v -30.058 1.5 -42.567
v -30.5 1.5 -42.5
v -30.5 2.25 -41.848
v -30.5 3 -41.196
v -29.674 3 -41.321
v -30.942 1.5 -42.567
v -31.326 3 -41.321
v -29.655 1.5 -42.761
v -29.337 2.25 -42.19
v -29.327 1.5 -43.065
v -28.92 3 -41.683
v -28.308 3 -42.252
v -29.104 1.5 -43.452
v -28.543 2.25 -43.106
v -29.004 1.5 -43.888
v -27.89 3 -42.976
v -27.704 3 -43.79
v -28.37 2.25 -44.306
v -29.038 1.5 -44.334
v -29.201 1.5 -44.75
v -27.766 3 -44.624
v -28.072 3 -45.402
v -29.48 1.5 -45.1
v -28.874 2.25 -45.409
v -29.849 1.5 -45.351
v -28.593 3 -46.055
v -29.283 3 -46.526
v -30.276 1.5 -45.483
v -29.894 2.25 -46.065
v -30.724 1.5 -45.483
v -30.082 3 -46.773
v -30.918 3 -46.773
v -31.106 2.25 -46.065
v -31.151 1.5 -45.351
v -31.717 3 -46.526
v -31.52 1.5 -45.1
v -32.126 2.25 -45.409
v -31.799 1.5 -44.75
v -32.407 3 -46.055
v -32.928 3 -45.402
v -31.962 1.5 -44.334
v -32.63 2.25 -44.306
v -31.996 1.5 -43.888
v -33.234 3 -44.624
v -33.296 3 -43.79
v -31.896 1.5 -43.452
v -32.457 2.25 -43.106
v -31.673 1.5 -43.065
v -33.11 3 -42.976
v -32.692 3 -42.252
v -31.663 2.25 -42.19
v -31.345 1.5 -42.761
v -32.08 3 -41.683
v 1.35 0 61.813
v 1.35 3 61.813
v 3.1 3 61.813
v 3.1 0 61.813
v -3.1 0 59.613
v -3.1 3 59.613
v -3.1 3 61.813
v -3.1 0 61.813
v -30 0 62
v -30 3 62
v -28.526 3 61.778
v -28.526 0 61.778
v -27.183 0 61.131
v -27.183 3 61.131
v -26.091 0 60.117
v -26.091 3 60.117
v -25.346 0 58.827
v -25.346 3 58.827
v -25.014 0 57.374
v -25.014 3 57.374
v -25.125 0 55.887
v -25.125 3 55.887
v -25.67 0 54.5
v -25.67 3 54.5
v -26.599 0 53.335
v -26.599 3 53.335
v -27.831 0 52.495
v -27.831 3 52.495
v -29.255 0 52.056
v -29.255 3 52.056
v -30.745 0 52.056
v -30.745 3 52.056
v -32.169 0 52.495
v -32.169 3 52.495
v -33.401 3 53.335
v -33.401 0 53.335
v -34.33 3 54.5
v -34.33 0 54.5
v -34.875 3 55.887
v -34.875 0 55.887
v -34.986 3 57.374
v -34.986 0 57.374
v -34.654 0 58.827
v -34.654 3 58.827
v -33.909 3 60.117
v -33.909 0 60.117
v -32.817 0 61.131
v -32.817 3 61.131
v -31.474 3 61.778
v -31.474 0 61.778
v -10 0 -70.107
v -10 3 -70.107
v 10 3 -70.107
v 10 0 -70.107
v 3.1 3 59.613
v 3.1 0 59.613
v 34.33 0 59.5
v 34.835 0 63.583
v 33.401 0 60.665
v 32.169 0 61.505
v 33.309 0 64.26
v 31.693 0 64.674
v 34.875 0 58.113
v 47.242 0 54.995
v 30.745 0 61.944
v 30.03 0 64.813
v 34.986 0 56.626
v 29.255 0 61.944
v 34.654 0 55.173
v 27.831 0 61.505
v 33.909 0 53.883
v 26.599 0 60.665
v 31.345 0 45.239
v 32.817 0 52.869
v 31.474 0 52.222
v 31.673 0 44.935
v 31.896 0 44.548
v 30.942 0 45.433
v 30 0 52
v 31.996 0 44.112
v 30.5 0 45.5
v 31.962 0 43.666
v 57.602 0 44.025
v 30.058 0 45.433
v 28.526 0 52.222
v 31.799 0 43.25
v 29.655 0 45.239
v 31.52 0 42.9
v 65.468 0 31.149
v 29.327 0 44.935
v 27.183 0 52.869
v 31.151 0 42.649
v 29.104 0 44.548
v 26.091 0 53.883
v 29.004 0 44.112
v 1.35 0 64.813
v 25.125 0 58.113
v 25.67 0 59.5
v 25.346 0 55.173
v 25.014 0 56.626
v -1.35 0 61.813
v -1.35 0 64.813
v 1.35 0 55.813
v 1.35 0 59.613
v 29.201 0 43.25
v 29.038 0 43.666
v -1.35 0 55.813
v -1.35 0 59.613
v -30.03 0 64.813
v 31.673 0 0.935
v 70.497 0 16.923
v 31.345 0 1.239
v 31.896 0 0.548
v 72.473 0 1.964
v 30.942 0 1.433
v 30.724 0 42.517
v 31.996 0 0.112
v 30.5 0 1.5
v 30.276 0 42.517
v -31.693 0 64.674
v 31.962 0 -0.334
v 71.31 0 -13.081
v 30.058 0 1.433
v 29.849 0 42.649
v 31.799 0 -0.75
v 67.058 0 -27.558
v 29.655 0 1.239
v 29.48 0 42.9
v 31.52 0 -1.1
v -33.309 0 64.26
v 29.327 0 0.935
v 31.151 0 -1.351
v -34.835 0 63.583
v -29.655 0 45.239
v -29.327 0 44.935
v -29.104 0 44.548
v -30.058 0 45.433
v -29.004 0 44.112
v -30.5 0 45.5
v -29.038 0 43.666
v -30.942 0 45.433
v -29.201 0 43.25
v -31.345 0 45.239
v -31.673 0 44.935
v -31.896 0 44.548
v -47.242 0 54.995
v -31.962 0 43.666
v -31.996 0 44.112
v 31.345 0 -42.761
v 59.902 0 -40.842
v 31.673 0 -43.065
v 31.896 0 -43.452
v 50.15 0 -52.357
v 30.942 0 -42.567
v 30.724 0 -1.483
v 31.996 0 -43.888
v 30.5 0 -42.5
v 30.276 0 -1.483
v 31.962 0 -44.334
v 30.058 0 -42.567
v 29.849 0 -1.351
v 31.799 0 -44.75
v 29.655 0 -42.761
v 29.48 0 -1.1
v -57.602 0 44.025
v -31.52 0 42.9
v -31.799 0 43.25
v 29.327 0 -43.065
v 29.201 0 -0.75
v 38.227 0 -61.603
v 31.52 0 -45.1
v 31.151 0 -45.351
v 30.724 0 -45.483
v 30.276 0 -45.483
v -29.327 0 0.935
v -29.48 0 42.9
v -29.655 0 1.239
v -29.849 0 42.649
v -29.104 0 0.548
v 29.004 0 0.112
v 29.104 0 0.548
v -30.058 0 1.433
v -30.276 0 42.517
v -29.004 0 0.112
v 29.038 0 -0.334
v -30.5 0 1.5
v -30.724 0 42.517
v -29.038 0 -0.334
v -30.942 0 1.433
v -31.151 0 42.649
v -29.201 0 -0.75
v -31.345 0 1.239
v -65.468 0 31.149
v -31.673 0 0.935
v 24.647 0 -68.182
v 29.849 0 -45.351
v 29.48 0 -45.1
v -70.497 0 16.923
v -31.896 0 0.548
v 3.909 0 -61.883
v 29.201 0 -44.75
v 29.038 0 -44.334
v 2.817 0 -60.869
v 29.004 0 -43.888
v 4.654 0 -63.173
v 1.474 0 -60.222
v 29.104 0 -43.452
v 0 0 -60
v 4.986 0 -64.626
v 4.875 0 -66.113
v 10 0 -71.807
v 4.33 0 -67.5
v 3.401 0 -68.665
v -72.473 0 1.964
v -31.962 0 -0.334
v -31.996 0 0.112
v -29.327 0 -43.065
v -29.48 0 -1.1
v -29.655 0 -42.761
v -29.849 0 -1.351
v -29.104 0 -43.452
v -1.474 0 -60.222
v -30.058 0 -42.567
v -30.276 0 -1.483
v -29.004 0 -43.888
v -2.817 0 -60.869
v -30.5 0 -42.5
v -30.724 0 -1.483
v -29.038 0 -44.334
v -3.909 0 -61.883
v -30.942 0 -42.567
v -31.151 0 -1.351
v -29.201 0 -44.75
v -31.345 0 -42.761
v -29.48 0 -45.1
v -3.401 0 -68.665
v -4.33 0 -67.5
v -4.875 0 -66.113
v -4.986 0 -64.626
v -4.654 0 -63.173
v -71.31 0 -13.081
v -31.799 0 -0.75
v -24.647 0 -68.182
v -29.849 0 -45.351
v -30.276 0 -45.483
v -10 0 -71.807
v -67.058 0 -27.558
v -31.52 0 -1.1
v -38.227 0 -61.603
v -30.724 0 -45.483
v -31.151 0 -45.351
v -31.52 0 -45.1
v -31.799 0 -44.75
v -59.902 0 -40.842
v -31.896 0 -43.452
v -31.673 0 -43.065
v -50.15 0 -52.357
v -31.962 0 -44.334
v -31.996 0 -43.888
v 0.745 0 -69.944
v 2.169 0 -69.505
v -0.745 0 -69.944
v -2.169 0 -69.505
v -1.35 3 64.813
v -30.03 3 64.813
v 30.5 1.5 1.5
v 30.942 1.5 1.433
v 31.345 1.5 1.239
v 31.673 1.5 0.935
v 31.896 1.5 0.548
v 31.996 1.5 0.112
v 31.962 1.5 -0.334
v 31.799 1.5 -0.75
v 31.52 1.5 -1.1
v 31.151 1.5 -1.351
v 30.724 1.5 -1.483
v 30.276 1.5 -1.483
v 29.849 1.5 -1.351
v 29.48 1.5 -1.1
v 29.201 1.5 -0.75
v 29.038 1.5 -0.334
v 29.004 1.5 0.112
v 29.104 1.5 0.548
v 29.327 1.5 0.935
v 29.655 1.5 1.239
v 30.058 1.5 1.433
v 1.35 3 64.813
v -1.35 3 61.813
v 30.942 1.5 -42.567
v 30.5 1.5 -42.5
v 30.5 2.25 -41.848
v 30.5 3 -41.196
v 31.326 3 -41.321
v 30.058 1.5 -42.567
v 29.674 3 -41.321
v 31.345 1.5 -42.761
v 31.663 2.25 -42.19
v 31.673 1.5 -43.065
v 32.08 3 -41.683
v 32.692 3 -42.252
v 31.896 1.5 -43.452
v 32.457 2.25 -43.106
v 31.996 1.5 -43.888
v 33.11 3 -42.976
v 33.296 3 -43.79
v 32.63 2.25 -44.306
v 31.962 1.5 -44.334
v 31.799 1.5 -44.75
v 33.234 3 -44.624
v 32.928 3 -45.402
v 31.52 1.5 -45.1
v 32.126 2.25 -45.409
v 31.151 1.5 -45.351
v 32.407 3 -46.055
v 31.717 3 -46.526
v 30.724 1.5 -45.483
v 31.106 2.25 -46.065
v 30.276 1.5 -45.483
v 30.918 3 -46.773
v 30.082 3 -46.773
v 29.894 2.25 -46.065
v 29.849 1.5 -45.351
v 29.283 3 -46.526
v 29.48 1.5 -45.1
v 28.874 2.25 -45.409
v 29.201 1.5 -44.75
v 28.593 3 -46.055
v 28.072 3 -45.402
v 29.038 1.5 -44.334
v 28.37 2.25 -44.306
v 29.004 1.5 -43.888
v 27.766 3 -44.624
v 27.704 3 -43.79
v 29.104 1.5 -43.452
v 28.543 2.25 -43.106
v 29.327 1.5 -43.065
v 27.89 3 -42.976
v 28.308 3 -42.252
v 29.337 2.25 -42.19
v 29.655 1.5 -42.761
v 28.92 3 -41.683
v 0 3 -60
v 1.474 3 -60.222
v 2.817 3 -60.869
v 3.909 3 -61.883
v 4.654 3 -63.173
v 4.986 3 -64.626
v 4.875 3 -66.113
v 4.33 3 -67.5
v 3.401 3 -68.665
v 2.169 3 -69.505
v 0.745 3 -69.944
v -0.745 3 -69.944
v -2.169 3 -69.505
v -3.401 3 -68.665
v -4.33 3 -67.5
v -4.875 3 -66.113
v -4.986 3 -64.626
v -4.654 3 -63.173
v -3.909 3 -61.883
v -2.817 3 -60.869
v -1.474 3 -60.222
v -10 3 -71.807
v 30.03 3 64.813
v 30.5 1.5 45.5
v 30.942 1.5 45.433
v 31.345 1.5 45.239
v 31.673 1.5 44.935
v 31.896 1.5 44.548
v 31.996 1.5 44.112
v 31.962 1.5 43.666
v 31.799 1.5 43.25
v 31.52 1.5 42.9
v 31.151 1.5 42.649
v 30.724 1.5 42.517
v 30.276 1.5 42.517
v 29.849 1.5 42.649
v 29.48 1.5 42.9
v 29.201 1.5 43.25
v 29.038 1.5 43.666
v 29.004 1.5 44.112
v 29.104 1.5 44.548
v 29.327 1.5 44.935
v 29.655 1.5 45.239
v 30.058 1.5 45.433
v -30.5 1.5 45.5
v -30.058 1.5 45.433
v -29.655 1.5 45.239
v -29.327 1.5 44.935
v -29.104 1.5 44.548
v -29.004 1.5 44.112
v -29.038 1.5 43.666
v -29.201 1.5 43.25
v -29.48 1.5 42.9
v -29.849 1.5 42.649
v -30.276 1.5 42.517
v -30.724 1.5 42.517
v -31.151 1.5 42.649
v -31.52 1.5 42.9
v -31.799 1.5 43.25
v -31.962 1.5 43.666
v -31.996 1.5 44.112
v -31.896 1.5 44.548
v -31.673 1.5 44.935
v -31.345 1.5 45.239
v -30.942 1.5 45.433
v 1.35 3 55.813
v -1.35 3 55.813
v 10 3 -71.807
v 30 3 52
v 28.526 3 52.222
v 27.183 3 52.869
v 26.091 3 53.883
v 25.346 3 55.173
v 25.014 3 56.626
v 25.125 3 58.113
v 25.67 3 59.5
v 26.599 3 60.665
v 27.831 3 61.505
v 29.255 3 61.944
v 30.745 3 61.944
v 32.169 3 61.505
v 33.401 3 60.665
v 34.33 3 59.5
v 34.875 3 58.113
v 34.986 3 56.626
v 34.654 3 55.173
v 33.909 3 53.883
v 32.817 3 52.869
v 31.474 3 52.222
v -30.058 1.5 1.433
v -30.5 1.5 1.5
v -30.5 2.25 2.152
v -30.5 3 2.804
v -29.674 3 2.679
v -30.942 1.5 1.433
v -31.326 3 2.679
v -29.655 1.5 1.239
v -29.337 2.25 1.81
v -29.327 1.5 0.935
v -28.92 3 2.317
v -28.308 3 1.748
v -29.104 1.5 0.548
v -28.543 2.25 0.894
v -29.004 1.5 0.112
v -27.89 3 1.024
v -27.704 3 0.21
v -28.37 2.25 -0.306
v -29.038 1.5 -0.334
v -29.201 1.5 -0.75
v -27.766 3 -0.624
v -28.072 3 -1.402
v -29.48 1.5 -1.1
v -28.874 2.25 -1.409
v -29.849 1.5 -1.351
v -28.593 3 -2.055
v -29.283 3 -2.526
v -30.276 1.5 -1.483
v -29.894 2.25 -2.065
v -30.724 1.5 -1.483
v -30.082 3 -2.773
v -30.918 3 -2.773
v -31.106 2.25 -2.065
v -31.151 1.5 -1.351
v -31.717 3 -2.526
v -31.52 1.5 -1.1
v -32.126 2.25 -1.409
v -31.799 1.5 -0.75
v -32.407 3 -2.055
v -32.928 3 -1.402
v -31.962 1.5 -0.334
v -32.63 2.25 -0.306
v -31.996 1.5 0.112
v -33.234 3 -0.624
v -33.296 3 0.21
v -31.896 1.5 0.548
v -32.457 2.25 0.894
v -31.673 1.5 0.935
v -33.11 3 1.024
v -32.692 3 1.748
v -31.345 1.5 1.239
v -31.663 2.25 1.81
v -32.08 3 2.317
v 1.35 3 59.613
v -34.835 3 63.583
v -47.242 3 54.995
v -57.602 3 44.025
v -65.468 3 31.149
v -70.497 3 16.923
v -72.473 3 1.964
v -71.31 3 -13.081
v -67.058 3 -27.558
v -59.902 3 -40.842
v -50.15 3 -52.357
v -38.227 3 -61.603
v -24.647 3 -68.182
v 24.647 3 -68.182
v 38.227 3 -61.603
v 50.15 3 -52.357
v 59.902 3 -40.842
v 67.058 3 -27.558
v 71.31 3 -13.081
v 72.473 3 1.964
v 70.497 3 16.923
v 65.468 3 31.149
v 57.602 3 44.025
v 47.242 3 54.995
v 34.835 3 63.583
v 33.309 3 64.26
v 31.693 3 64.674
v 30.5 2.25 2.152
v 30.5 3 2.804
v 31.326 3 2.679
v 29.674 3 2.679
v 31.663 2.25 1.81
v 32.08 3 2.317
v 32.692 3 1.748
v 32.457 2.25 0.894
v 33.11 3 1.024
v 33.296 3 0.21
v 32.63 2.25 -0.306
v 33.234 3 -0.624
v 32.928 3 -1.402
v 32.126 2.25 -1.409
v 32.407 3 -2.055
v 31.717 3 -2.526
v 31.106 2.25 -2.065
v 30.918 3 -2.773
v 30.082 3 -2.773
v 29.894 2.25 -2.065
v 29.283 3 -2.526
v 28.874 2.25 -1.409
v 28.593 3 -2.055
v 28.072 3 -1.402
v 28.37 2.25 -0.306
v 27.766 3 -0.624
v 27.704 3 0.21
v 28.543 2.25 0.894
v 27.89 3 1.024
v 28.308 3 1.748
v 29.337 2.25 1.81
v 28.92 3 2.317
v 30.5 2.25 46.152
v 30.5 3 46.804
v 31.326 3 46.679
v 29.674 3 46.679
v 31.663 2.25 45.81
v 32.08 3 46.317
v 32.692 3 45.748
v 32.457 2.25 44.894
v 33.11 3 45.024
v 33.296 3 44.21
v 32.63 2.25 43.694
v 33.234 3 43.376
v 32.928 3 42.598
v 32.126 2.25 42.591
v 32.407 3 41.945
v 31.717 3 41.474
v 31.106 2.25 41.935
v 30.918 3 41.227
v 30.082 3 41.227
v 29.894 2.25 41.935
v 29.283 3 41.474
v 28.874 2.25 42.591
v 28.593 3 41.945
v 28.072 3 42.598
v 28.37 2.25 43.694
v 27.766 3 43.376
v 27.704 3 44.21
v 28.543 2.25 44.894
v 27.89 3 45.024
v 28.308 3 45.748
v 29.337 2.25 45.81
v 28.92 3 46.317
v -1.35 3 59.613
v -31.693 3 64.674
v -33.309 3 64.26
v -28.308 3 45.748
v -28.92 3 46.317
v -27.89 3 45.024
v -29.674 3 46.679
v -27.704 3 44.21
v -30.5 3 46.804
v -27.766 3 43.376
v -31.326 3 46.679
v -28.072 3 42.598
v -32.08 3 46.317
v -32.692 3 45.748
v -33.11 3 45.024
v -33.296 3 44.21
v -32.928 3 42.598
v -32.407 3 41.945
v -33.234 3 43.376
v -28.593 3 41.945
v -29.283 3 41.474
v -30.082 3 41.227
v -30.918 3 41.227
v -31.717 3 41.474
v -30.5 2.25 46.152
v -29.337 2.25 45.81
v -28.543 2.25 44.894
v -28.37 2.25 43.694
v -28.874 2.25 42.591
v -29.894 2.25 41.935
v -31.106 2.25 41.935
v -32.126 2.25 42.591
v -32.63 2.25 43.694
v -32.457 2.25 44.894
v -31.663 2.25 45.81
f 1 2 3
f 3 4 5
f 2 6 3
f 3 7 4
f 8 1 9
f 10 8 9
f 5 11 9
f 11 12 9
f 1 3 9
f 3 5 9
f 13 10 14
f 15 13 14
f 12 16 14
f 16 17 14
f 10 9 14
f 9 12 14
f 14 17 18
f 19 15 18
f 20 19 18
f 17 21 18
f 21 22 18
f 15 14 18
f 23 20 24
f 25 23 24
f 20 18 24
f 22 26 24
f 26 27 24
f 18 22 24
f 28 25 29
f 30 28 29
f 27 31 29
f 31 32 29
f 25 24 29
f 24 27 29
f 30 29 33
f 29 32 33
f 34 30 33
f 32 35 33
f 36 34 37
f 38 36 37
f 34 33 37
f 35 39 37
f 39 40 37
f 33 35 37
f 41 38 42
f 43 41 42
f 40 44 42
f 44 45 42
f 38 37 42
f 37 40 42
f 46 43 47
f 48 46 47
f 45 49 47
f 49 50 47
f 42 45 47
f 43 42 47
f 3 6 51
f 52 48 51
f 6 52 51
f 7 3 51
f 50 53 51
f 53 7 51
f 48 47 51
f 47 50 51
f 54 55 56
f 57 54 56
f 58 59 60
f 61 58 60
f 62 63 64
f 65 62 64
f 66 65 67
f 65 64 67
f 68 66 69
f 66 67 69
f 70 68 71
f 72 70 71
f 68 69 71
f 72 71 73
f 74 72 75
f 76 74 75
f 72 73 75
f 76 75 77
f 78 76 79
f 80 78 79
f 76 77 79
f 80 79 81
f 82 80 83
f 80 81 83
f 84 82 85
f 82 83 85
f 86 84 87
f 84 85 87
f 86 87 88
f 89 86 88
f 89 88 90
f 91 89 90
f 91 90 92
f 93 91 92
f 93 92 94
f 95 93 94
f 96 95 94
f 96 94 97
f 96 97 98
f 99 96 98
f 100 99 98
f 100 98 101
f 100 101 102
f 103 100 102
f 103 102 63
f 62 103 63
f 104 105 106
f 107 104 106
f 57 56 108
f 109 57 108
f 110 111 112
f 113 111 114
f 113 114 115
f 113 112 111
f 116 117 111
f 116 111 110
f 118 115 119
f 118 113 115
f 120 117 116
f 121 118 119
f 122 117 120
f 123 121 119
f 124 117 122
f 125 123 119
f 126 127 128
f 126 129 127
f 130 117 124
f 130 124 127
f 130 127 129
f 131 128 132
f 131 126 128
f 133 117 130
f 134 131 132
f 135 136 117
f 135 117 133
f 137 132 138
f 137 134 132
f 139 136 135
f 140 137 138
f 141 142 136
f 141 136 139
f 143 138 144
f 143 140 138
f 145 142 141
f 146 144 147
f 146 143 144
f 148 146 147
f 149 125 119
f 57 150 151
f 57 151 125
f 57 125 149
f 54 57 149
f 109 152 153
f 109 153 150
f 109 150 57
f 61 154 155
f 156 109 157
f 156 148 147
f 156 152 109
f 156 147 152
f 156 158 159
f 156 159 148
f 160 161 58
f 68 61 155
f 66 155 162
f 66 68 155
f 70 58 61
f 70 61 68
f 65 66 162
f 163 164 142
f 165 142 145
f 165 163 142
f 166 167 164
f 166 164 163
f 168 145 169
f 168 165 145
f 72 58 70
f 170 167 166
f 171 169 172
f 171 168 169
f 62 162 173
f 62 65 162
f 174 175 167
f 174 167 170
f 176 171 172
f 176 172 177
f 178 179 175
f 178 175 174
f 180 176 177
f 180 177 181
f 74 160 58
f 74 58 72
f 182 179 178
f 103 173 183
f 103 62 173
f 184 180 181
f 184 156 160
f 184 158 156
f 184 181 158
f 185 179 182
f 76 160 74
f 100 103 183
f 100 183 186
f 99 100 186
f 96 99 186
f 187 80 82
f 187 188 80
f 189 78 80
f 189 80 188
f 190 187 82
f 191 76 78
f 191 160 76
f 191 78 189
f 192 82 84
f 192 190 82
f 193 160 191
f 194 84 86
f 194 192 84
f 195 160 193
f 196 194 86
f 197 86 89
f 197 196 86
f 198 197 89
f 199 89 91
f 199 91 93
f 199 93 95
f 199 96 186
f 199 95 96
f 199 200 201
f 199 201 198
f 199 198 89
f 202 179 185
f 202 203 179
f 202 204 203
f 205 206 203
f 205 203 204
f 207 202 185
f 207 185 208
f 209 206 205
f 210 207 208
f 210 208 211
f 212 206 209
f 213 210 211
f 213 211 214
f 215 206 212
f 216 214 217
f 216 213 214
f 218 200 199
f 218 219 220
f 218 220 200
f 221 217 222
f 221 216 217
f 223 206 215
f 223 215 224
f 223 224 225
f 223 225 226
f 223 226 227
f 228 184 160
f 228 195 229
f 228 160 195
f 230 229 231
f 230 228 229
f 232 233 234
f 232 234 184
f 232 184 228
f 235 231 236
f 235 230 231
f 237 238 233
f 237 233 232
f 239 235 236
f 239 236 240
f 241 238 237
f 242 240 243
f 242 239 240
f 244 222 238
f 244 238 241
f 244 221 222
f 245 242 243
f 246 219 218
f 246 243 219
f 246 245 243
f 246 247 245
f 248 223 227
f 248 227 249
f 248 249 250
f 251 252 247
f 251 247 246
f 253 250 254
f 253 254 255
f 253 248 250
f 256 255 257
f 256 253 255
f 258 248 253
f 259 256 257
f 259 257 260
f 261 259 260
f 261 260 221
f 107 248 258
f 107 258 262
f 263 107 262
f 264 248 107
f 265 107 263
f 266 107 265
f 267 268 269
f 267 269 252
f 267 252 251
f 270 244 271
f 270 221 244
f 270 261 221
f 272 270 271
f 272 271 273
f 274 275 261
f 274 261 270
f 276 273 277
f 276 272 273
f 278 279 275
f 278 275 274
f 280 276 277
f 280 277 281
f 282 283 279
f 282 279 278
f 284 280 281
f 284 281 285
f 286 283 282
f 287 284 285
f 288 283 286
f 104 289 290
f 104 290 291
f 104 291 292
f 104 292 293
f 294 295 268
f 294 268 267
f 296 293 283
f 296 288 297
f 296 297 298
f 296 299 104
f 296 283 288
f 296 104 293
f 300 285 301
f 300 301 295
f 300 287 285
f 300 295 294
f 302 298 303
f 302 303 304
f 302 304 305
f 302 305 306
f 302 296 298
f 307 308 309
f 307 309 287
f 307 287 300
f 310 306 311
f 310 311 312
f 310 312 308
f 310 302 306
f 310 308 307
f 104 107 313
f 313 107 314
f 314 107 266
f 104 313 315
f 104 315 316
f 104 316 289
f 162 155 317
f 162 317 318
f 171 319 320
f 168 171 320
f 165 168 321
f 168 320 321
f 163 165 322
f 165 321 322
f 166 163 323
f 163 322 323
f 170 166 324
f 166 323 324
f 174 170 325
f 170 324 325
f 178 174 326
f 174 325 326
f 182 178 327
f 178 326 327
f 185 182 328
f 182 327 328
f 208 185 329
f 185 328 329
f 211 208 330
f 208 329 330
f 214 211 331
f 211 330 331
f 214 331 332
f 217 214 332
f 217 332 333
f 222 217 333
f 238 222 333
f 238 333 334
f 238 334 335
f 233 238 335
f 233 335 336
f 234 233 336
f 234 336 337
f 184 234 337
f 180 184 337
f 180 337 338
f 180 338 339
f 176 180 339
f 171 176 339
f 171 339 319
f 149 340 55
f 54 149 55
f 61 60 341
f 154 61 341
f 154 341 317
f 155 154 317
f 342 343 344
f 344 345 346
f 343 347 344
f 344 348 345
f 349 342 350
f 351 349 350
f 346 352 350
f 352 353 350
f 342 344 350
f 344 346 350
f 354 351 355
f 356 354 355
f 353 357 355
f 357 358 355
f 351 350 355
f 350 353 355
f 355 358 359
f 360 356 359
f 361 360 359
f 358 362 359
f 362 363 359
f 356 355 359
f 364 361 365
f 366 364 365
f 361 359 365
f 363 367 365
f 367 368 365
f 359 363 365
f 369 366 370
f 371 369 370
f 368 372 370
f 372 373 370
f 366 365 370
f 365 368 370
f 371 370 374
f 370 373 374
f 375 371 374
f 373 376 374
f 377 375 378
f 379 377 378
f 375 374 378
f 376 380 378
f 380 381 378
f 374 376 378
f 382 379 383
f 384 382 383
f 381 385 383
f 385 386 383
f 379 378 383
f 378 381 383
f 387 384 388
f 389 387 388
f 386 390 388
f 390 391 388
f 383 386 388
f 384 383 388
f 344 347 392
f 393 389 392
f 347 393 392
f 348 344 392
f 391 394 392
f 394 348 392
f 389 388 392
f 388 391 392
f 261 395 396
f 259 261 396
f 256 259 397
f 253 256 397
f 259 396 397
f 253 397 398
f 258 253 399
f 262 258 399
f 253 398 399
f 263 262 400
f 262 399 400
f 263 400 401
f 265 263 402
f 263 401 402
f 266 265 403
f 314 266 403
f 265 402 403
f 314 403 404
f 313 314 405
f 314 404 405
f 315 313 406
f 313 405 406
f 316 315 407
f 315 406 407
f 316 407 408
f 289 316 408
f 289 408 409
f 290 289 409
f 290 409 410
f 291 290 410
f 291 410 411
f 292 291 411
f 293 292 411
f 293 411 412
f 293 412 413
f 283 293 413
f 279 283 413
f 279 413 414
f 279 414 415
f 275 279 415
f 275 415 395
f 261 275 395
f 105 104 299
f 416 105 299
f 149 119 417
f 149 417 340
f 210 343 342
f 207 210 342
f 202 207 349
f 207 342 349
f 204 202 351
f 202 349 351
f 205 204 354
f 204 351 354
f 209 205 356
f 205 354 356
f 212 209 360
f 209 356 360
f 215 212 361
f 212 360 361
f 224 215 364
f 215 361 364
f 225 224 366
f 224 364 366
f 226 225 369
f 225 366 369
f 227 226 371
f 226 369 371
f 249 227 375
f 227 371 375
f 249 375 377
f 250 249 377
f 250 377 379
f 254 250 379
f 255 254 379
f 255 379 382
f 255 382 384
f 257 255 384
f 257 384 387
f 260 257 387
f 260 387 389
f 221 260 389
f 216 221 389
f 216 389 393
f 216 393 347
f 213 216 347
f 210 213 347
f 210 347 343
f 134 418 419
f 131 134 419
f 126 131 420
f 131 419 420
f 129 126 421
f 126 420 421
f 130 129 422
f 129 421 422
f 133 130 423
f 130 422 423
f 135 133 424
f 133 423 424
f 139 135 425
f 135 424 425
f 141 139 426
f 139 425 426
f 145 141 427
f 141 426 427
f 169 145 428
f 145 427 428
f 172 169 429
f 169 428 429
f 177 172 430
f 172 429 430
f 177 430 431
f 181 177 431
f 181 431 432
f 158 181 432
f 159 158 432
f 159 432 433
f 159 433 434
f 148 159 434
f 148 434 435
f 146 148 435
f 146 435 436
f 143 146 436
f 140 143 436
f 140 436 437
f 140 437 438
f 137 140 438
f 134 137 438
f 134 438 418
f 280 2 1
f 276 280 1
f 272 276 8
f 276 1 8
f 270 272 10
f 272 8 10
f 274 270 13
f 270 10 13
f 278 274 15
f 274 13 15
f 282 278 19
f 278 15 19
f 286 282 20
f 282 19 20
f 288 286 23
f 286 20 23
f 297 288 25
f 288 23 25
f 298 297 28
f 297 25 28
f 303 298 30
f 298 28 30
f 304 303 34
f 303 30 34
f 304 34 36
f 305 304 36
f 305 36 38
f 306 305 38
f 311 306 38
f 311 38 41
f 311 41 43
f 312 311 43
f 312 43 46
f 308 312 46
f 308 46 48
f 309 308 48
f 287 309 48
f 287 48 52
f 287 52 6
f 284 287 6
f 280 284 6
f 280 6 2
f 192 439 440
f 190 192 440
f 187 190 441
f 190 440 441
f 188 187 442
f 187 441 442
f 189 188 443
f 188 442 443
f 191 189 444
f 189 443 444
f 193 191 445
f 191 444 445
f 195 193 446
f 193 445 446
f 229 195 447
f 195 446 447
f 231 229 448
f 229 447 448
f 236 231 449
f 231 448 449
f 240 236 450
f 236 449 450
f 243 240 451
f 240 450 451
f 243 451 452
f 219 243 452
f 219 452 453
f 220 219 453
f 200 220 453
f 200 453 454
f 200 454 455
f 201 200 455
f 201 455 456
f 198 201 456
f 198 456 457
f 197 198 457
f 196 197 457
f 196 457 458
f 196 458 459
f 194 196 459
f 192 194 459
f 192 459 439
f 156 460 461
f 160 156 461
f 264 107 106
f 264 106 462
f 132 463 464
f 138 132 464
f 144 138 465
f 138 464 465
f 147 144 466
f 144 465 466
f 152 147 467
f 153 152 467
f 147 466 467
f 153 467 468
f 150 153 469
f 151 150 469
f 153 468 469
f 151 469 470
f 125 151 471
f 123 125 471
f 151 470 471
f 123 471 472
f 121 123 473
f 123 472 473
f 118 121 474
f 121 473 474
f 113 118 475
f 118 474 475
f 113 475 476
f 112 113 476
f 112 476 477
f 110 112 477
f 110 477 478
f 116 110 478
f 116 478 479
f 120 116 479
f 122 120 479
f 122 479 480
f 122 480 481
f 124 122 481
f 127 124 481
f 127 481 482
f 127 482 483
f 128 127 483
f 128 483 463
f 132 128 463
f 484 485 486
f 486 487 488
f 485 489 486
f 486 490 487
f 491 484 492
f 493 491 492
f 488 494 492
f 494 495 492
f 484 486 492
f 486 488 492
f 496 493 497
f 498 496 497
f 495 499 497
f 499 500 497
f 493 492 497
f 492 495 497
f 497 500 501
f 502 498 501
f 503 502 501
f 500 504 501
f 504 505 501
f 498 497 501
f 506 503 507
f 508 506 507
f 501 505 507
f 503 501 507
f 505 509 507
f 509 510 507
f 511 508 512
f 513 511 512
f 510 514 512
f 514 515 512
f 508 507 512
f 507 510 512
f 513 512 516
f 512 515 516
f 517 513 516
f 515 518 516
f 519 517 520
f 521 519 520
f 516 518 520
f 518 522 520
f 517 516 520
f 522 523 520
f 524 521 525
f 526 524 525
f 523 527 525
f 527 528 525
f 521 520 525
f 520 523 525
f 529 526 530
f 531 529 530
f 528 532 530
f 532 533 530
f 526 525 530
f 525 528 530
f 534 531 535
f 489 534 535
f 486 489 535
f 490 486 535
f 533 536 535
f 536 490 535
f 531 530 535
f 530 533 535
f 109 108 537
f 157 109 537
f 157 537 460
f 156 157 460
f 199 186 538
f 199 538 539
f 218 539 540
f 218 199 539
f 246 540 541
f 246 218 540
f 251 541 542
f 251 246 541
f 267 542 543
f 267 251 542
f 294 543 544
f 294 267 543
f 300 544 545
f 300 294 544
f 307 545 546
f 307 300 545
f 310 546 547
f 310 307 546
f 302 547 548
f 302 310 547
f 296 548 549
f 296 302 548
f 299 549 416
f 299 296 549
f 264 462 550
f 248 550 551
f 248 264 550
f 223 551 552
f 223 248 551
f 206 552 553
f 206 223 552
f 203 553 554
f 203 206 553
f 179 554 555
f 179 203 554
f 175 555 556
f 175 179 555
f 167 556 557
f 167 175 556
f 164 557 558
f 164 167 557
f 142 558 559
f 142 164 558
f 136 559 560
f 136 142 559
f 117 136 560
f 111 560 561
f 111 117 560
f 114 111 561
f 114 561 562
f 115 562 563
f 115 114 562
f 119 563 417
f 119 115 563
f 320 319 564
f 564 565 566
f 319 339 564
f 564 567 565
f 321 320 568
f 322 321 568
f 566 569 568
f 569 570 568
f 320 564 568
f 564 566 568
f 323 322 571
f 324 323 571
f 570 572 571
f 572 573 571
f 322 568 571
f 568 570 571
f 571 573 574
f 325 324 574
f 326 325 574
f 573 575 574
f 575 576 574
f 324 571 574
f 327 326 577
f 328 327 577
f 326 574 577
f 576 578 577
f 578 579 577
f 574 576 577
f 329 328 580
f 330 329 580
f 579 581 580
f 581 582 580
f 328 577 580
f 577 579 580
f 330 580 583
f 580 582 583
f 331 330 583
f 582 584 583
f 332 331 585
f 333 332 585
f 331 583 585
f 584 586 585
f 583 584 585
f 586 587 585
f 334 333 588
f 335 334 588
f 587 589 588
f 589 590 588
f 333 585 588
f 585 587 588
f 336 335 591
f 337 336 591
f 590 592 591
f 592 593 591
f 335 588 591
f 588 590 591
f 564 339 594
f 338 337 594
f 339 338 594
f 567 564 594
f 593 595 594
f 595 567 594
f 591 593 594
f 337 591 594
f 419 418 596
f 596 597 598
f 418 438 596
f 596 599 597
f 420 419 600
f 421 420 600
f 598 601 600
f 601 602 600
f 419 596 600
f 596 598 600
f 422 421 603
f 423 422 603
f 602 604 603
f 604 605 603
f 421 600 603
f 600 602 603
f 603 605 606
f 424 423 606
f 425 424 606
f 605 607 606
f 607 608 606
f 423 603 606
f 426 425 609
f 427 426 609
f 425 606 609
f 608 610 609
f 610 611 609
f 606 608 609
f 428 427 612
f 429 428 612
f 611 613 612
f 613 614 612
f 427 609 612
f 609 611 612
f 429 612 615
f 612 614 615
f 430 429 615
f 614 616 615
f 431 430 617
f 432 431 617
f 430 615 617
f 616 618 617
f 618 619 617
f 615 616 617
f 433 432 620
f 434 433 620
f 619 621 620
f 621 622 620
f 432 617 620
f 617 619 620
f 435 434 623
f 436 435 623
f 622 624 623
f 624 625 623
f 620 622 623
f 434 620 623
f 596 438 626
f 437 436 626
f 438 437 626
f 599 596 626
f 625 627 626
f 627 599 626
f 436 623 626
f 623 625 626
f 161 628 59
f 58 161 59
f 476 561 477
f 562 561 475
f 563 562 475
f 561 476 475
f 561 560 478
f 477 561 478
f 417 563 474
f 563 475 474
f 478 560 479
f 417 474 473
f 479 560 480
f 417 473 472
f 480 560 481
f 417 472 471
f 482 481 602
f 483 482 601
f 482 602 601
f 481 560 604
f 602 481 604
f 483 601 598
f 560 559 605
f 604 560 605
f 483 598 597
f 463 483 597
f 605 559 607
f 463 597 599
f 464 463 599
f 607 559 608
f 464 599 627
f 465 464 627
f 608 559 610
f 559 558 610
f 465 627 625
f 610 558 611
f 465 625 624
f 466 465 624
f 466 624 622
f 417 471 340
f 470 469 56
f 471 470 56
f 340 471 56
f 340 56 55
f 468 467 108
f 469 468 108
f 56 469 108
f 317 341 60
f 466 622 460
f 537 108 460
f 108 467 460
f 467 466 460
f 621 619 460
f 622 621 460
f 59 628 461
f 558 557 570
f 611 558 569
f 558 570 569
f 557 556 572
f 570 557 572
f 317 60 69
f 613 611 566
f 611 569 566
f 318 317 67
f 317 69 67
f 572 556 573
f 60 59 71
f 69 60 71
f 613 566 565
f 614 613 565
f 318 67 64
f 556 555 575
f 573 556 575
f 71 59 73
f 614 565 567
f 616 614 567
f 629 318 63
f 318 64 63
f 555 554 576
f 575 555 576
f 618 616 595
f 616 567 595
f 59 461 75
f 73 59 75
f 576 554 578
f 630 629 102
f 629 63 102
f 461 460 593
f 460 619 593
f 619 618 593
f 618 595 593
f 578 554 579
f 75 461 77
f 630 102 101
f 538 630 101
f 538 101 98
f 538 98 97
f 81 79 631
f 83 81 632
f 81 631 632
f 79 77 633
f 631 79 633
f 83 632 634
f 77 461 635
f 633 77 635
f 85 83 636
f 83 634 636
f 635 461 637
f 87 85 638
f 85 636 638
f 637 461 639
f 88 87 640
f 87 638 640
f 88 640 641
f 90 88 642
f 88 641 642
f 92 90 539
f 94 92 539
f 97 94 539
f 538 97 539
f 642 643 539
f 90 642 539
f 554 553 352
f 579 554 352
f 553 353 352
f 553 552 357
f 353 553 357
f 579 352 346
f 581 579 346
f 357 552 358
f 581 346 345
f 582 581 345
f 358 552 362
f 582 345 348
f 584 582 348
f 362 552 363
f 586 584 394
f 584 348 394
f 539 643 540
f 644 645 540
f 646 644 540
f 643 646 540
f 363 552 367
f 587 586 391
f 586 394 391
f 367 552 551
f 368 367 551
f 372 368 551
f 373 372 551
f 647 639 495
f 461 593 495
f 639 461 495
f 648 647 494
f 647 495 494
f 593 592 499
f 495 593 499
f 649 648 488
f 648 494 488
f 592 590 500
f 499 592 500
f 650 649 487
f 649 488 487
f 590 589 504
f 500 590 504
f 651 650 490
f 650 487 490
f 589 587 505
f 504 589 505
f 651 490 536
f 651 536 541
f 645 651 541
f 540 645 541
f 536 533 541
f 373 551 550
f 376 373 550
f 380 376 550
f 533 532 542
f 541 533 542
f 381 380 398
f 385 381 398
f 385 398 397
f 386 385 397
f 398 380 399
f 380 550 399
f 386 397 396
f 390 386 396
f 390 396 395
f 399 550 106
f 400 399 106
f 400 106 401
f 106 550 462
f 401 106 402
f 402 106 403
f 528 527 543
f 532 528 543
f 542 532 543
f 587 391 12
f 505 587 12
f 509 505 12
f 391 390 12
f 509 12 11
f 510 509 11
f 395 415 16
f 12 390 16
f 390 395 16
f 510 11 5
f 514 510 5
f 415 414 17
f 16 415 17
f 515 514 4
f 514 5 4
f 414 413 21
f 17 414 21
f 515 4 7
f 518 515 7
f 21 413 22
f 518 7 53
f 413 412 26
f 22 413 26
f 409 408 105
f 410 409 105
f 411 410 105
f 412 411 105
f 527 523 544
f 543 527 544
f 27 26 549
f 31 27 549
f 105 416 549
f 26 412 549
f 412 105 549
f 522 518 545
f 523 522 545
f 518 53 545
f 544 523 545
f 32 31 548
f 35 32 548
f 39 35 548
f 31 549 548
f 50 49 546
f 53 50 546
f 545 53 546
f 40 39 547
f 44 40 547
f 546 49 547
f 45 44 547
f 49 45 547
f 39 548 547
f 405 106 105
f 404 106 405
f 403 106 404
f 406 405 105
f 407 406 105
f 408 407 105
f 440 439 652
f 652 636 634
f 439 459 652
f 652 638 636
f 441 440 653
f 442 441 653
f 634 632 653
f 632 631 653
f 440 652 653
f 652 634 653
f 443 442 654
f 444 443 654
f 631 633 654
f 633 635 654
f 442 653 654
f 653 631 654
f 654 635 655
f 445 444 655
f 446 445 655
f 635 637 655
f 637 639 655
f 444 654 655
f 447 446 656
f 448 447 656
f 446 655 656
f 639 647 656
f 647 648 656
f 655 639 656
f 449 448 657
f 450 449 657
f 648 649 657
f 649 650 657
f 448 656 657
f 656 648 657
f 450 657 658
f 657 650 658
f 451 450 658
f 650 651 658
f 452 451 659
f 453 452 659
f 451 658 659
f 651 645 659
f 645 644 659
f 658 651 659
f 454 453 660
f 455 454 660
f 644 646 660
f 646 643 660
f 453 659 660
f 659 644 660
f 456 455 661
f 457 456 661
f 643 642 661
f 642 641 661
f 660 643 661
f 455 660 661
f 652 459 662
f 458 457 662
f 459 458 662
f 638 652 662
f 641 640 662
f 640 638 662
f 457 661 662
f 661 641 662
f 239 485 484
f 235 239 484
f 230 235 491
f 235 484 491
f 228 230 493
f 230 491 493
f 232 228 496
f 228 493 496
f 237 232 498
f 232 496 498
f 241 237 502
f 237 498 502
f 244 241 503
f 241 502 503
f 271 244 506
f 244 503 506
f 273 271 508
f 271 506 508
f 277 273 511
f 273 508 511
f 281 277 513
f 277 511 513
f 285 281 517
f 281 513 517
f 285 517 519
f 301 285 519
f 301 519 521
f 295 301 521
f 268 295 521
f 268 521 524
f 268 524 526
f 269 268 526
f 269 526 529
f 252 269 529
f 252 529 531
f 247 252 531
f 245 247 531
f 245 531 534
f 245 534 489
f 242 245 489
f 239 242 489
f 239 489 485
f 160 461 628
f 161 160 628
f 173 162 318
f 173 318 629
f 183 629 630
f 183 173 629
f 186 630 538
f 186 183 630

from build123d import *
from OCP.BRepFilletAPI import BRepFilletAPI_MakeChamfer

# Parameters (mm, degrees)
BOSS_EXTRUDE1_DEPTH = 3
SKETCH2_R           = 1.5
CUT_EXTRUDE1_DEPTH  = 103.574363269
CHAMFER1_SIZE       = 1.5
CHAMFER1_SIZE2      = 1.303930107
CUT_EXTRUDE2_DEPTH  = 103.574363269
SKETCH4_W           = 20
SKETCH4_H           = 1.7
CUT_EXTRUDE3_DEPTH  = 103.574363269
SKETCH5_R           = 5
CUT_EXTRUDE4_DEPTH  = 103.085748271


with BuildPart() as part:
    # Sketch1 → Boss-Extrude1 (new body)
    with BuildSketch(Plane(origin=(0, 0, 0), x_dir=(1, 0, 0), z_dir=(0, 1, 0))):
        with BuildLine():
            Line((30.029977361, -64.812867647), (-30.029977361, -64.812867647))
            ThreePointArc((-30.029977361, -64.812867647), (-32.509837414, -64.500503794), (-34.834773739, -63.582926471))
            ThreePointArc((-34.834773739, -63.582926471), (0, 72.5), (34.834773739, -63.582926471))
            ThreePointArc((34.834773739, -63.582926471), (32.509837414, -64.500503794), (30.029977361, -64.812867647))
        make_face()
    extrude(amount=BOSS_EXTRUDE1_DEPTH)

    # Sketch2 → Cut-Extrude1 (cut, through all)
    with BuildSketch(Plane(origin=(0, 3, 0), x_dir=(1, 0, 0), z_dir=(0, 1, 0))):
        with Locations(Location((-30.5, 44, 0), (0, 0, 270))):
            Circle(SKETCH2_R)
        with Locations(Location((30.5, 44, 0), (0, 0, 270))):
            Circle(SKETCH2_R)
        with Locations(Location((30.5, 0, 0), (0, 0, 270))):
            Circle(SKETCH2_R)
        with Locations(Location((30.5, -44, 0), (0, 0, 270))):
            Circle(SKETCH2_R)
        with Locations(Location((-30.5, -44, 0), (0, 0, 270))):
            Circle(SKETCH2_R)
        with Locations(Location((-30.5, 0, 0), (0, 0, 270))):
            Circle(SKETCH2_R)
    extrude(amount=-CUT_EXTRUDE1_DEPTH, mode=Mode.SUBTRACT)

    # Chamfer1: one chamfer whose edges measure the first distance from different faces: ONE call of the kernel's chamfer builder (chamfer() names one face for all edges)
    chamfer1_edges_1 = [part.edges().sort_by_distance(p)[0] for p in [
        (-30.5, 3, -45.5),
    ]]
    chamfer1_side_1 = [part.faces().sort_by_distance(p)[0] for p in [
        (-30.5, 1.5, -45.5),
    ]]
    chamfer1_edges_2 = [part.edges().sort_by_distance(p)[0] for p in [
        (-30.5, 3, -1.5),
    ]]
    chamfer1_side_2 = [part.faces().sort_by_distance(p)[0] for p in [
        (-30.5, 1.5, -1.5),
    ]]
    chamfer1_edges_3 = [part.edges().sort_by_distance(p)[0] for p in [
        (-30.5, 3, 42.5),
    ]]
    chamfer1_side_3 = [part.faces().sort_by_distance(p)[0] for p in [
        (-30.5, 1.5, 42.5),
    ]]
    chamfer1_edges_4 = [part.edges().sort_by_distance(p)[0] for p in [
        (30.5, 3, 42.5),
    ]]
    chamfer1_side_4 = [part.faces().sort_by_distance(p)[0] for p in [
        (30.5, 1.5, 42.5),
    ]]
    chamfer1_edges_5 = [part.edges().sort_by_distance(p)[0] for p in [
        (30.5, 3, -1.5),
    ]]
    chamfer1_side_5 = [part.faces().sort_by_distance(p)[0] for p in [
        (30.5, 1.5, -1.5),
    ]]
    chamfer1_edges_6 = [part.edges().sort_by_distance(p)[0] for p in [
        (30.5, 3, -45.5),
    ]]
    chamfer1_side_6 = [part.faces().sort_by_distance(p)[0] for p in [
        (30.5, 1.5, -45.5),
    ]]
    chamfer1 = BRepFilletAPI_MakeChamfer(part.part.solid().wrapped)
    for e in chamfer1_edges_1:
        chamfer1.Add(CHAMFER1_SIZE, CHAMFER1_SIZE2, e.wrapped, chamfer1_side_1[0].wrapped)  # the first distance lies on this face
    for e in chamfer1_edges_2:
        chamfer1.Add(CHAMFER1_SIZE, CHAMFER1_SIZE2, e.wrapped, chamfer1_side_2[0].wrapped)  # the first distance lies on this face
    for e in chamfer1_edges_3:
        chamfer1.Add(CHAMFER1_SIZE, CHAMFER1_SIZE2, e.wrapped, chamfer1_side_3[0].wrapped)  # the first distance lies on this face
    for e in chamfer1_edges_4:
        chamfer1.Add(CHAMFER1_SIZE, CHAMFER1_SIZE2, e.wrapped, chamfer1_side_4[0].wrapped)  # the first distance lies on this face
    for e in chamfer1_edges_5:
        chamfer1.Add(CHAMFER1_SIZE, CHAMFER1_SIZE2, e.wrapped, chamfer1_side_5[0].wrapped)  # the first distance lies on this face
    for e in chamfer1_edges_6:
        chamfer1.Add(CHAMFER1_SIZE, CHAMFER1_SIZE2, e.wrapped, chamfer1_side_6[0].wrapped)  # the first distance lies on this face
    add(Compound.cast(chamfer1.Shape()), mode=Mode.REPLACE)

    # Sketch3 → Cut-Extrude2 (cut, through all)
    with BuildSketch(Plane(origin=(0, 3, 0), x_dir=(1, 0, 0), z_dir=(0, 1, 0))):
        Polygon((1.35, -61.812867647), (3.1, -61.812867647), (3.1, -59.612867647), (1.35, -59.612867647), (1.35, -55.812867647), (-1.35, -55.812867647), (-1.35, -59.612867647), (-3.1, -59.612867647), (-3.1, -61.812867647), (-1.35, -61.812867647), (-1.35, -64.812867647), (1.35, -64.812867647), align=None)
    extrude(amount=-CUT_EXTRUDE2_DEPTH, mode=Mode.SUBTRACT)

    # Sketch4 → Cut-Extrude3 (cut, through all)
    with BuildSketch(Plane(origin=(0, 3, 0), x_dir=(1, 0, 0), z_dir=(0, 1, 0))):
        with Locations((0, 70.957033082)):
            Rectangle(SKETCH4_W, SKETCH4_H)
    extrude(amount=-CUT_EXTRUDE3_DEPTH, mode=Mode.SUBTRACT)


with BuildPart() as body_2:
    # of the pieces the cut leaves, the one that is kept (cut_extrude3_keep)
    add(part.part.solids().sort_by_distance((-30.029977361, 3, 64.812867647))[0])

    # Sketch5 → Cut-Extrude4 (cut, through all)
    with BuildSketch(Plane(origin=(0, 3, 0), x_dir=(1, 0, 0), z_dir=(0, 1, 0))):
        with Locations(Location((0, 65, 0), (0, 0, 270))):
            Circle(SKETCH5_R)
        with Locations(Location((30, -57, 0), (0, 0, 90))):
            Circle(SKETCH5_R)
        with Locations(Location((-30, -57, 0), (0, 0, 270))):
            Circle(SKETCH5_R)
    extrude(amount=-CUT_EXTRUDE4_DEPTH, mode=Mode.SUBTRACT)


solid = body_2.part
